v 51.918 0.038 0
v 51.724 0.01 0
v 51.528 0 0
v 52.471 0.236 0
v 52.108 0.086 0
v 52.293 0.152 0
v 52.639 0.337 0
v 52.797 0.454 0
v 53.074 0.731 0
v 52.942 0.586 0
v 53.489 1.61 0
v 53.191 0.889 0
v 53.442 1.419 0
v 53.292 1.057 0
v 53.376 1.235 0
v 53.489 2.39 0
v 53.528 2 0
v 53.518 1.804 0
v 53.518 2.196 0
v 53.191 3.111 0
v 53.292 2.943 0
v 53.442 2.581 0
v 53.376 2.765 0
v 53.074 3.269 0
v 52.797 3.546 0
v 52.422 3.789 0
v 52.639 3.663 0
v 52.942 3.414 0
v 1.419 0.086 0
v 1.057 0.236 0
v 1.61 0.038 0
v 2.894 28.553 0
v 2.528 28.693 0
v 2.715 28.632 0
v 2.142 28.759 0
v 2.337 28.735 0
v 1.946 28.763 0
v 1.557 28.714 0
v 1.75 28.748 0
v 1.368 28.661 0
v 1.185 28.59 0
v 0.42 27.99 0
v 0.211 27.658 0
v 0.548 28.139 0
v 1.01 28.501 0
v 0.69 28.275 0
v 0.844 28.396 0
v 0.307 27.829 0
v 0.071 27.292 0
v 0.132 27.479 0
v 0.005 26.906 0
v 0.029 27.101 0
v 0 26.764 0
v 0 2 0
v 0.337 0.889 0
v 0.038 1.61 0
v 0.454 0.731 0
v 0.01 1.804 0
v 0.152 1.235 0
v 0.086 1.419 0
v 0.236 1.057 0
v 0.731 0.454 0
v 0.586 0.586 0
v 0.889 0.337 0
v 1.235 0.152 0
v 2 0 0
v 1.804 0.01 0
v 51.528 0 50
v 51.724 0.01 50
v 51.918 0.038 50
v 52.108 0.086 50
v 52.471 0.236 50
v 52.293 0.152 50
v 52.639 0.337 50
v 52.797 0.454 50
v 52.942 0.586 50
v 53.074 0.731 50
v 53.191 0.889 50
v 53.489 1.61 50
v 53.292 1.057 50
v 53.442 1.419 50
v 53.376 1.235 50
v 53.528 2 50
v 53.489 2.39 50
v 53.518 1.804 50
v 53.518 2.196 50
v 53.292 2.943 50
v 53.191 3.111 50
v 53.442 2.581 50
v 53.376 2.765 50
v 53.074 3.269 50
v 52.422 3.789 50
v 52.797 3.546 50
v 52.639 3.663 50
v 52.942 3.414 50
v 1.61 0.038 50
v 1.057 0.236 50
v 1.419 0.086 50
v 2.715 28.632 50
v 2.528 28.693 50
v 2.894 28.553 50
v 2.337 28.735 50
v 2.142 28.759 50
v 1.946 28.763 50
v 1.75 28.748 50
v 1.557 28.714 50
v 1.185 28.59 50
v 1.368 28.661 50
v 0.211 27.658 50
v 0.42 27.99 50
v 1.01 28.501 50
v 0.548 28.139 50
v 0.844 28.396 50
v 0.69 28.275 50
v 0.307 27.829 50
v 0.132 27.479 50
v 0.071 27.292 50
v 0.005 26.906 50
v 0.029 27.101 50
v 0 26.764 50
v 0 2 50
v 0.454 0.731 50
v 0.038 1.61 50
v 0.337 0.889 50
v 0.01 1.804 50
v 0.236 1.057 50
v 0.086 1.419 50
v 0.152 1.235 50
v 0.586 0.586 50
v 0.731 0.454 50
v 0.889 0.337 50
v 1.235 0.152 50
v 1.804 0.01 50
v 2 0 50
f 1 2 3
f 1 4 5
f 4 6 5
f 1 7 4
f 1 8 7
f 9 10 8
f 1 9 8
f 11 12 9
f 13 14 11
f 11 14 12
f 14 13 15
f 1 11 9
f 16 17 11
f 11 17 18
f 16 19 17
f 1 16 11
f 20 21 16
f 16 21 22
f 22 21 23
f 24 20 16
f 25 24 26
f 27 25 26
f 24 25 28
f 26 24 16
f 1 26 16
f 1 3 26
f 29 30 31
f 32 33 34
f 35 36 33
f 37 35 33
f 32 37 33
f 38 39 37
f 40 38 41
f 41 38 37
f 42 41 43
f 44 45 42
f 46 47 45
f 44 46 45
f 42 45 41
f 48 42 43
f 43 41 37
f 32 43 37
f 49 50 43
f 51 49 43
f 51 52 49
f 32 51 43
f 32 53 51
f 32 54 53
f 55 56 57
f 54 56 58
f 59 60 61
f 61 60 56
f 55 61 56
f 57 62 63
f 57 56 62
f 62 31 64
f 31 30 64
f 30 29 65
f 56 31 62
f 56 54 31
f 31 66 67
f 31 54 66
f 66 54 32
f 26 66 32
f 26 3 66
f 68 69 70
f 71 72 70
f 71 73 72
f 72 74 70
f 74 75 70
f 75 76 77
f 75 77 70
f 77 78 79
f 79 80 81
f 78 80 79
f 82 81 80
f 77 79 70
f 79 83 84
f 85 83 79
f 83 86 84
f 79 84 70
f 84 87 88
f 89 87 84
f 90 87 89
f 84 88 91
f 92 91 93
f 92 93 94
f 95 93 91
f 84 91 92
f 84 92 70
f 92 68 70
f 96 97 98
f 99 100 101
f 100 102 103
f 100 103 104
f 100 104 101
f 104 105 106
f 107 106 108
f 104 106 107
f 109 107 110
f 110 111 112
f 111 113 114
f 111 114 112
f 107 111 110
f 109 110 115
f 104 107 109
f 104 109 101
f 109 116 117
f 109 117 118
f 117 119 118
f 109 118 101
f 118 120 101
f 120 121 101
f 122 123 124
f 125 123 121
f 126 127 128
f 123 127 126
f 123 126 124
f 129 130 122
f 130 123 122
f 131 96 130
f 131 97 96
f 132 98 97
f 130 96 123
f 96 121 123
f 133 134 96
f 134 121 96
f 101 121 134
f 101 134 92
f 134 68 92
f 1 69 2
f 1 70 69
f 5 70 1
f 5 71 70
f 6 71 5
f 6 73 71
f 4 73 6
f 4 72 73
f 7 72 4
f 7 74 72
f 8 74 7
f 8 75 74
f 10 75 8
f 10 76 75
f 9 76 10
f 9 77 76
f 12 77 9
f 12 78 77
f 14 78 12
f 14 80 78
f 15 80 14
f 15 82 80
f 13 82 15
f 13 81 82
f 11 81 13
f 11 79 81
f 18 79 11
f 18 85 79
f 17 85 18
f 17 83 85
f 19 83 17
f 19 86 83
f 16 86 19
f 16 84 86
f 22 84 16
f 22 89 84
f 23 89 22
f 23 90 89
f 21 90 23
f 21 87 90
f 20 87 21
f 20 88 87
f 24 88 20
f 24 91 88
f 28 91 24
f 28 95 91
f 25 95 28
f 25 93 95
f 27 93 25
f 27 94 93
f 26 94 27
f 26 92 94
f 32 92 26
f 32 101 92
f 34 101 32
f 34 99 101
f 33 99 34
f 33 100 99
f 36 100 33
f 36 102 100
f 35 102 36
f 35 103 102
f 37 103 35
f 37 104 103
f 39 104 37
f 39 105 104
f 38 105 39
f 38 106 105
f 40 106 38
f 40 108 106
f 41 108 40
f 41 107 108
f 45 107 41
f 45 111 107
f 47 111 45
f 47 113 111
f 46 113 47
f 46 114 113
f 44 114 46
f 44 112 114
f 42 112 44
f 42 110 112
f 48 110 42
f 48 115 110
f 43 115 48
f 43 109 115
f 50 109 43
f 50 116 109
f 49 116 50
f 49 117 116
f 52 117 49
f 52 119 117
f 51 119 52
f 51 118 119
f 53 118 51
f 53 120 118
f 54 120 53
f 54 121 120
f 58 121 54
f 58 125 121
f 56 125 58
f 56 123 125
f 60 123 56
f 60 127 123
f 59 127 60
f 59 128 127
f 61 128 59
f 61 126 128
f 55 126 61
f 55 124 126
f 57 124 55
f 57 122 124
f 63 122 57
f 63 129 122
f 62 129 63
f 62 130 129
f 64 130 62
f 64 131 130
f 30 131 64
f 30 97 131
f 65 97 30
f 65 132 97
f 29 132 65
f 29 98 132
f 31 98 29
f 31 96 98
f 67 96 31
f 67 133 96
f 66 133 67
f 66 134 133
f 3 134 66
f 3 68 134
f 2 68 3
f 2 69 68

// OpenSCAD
// Car window wedge

$fn = 64;

wedge_h = 30.0;
wedge_len = 60.0;
wedge_wid = 50.0;
wedge_rounding = 2;

linear_extrude(wedge_wid)
offset(wedge_rounding) offset(-wedge_rounding)
offset(-wedge_rounding) offset(wedge_rounding)
polygon([
    [0, 0],
    [wedge_len, 0],
    [0, wedge_h]
]);
